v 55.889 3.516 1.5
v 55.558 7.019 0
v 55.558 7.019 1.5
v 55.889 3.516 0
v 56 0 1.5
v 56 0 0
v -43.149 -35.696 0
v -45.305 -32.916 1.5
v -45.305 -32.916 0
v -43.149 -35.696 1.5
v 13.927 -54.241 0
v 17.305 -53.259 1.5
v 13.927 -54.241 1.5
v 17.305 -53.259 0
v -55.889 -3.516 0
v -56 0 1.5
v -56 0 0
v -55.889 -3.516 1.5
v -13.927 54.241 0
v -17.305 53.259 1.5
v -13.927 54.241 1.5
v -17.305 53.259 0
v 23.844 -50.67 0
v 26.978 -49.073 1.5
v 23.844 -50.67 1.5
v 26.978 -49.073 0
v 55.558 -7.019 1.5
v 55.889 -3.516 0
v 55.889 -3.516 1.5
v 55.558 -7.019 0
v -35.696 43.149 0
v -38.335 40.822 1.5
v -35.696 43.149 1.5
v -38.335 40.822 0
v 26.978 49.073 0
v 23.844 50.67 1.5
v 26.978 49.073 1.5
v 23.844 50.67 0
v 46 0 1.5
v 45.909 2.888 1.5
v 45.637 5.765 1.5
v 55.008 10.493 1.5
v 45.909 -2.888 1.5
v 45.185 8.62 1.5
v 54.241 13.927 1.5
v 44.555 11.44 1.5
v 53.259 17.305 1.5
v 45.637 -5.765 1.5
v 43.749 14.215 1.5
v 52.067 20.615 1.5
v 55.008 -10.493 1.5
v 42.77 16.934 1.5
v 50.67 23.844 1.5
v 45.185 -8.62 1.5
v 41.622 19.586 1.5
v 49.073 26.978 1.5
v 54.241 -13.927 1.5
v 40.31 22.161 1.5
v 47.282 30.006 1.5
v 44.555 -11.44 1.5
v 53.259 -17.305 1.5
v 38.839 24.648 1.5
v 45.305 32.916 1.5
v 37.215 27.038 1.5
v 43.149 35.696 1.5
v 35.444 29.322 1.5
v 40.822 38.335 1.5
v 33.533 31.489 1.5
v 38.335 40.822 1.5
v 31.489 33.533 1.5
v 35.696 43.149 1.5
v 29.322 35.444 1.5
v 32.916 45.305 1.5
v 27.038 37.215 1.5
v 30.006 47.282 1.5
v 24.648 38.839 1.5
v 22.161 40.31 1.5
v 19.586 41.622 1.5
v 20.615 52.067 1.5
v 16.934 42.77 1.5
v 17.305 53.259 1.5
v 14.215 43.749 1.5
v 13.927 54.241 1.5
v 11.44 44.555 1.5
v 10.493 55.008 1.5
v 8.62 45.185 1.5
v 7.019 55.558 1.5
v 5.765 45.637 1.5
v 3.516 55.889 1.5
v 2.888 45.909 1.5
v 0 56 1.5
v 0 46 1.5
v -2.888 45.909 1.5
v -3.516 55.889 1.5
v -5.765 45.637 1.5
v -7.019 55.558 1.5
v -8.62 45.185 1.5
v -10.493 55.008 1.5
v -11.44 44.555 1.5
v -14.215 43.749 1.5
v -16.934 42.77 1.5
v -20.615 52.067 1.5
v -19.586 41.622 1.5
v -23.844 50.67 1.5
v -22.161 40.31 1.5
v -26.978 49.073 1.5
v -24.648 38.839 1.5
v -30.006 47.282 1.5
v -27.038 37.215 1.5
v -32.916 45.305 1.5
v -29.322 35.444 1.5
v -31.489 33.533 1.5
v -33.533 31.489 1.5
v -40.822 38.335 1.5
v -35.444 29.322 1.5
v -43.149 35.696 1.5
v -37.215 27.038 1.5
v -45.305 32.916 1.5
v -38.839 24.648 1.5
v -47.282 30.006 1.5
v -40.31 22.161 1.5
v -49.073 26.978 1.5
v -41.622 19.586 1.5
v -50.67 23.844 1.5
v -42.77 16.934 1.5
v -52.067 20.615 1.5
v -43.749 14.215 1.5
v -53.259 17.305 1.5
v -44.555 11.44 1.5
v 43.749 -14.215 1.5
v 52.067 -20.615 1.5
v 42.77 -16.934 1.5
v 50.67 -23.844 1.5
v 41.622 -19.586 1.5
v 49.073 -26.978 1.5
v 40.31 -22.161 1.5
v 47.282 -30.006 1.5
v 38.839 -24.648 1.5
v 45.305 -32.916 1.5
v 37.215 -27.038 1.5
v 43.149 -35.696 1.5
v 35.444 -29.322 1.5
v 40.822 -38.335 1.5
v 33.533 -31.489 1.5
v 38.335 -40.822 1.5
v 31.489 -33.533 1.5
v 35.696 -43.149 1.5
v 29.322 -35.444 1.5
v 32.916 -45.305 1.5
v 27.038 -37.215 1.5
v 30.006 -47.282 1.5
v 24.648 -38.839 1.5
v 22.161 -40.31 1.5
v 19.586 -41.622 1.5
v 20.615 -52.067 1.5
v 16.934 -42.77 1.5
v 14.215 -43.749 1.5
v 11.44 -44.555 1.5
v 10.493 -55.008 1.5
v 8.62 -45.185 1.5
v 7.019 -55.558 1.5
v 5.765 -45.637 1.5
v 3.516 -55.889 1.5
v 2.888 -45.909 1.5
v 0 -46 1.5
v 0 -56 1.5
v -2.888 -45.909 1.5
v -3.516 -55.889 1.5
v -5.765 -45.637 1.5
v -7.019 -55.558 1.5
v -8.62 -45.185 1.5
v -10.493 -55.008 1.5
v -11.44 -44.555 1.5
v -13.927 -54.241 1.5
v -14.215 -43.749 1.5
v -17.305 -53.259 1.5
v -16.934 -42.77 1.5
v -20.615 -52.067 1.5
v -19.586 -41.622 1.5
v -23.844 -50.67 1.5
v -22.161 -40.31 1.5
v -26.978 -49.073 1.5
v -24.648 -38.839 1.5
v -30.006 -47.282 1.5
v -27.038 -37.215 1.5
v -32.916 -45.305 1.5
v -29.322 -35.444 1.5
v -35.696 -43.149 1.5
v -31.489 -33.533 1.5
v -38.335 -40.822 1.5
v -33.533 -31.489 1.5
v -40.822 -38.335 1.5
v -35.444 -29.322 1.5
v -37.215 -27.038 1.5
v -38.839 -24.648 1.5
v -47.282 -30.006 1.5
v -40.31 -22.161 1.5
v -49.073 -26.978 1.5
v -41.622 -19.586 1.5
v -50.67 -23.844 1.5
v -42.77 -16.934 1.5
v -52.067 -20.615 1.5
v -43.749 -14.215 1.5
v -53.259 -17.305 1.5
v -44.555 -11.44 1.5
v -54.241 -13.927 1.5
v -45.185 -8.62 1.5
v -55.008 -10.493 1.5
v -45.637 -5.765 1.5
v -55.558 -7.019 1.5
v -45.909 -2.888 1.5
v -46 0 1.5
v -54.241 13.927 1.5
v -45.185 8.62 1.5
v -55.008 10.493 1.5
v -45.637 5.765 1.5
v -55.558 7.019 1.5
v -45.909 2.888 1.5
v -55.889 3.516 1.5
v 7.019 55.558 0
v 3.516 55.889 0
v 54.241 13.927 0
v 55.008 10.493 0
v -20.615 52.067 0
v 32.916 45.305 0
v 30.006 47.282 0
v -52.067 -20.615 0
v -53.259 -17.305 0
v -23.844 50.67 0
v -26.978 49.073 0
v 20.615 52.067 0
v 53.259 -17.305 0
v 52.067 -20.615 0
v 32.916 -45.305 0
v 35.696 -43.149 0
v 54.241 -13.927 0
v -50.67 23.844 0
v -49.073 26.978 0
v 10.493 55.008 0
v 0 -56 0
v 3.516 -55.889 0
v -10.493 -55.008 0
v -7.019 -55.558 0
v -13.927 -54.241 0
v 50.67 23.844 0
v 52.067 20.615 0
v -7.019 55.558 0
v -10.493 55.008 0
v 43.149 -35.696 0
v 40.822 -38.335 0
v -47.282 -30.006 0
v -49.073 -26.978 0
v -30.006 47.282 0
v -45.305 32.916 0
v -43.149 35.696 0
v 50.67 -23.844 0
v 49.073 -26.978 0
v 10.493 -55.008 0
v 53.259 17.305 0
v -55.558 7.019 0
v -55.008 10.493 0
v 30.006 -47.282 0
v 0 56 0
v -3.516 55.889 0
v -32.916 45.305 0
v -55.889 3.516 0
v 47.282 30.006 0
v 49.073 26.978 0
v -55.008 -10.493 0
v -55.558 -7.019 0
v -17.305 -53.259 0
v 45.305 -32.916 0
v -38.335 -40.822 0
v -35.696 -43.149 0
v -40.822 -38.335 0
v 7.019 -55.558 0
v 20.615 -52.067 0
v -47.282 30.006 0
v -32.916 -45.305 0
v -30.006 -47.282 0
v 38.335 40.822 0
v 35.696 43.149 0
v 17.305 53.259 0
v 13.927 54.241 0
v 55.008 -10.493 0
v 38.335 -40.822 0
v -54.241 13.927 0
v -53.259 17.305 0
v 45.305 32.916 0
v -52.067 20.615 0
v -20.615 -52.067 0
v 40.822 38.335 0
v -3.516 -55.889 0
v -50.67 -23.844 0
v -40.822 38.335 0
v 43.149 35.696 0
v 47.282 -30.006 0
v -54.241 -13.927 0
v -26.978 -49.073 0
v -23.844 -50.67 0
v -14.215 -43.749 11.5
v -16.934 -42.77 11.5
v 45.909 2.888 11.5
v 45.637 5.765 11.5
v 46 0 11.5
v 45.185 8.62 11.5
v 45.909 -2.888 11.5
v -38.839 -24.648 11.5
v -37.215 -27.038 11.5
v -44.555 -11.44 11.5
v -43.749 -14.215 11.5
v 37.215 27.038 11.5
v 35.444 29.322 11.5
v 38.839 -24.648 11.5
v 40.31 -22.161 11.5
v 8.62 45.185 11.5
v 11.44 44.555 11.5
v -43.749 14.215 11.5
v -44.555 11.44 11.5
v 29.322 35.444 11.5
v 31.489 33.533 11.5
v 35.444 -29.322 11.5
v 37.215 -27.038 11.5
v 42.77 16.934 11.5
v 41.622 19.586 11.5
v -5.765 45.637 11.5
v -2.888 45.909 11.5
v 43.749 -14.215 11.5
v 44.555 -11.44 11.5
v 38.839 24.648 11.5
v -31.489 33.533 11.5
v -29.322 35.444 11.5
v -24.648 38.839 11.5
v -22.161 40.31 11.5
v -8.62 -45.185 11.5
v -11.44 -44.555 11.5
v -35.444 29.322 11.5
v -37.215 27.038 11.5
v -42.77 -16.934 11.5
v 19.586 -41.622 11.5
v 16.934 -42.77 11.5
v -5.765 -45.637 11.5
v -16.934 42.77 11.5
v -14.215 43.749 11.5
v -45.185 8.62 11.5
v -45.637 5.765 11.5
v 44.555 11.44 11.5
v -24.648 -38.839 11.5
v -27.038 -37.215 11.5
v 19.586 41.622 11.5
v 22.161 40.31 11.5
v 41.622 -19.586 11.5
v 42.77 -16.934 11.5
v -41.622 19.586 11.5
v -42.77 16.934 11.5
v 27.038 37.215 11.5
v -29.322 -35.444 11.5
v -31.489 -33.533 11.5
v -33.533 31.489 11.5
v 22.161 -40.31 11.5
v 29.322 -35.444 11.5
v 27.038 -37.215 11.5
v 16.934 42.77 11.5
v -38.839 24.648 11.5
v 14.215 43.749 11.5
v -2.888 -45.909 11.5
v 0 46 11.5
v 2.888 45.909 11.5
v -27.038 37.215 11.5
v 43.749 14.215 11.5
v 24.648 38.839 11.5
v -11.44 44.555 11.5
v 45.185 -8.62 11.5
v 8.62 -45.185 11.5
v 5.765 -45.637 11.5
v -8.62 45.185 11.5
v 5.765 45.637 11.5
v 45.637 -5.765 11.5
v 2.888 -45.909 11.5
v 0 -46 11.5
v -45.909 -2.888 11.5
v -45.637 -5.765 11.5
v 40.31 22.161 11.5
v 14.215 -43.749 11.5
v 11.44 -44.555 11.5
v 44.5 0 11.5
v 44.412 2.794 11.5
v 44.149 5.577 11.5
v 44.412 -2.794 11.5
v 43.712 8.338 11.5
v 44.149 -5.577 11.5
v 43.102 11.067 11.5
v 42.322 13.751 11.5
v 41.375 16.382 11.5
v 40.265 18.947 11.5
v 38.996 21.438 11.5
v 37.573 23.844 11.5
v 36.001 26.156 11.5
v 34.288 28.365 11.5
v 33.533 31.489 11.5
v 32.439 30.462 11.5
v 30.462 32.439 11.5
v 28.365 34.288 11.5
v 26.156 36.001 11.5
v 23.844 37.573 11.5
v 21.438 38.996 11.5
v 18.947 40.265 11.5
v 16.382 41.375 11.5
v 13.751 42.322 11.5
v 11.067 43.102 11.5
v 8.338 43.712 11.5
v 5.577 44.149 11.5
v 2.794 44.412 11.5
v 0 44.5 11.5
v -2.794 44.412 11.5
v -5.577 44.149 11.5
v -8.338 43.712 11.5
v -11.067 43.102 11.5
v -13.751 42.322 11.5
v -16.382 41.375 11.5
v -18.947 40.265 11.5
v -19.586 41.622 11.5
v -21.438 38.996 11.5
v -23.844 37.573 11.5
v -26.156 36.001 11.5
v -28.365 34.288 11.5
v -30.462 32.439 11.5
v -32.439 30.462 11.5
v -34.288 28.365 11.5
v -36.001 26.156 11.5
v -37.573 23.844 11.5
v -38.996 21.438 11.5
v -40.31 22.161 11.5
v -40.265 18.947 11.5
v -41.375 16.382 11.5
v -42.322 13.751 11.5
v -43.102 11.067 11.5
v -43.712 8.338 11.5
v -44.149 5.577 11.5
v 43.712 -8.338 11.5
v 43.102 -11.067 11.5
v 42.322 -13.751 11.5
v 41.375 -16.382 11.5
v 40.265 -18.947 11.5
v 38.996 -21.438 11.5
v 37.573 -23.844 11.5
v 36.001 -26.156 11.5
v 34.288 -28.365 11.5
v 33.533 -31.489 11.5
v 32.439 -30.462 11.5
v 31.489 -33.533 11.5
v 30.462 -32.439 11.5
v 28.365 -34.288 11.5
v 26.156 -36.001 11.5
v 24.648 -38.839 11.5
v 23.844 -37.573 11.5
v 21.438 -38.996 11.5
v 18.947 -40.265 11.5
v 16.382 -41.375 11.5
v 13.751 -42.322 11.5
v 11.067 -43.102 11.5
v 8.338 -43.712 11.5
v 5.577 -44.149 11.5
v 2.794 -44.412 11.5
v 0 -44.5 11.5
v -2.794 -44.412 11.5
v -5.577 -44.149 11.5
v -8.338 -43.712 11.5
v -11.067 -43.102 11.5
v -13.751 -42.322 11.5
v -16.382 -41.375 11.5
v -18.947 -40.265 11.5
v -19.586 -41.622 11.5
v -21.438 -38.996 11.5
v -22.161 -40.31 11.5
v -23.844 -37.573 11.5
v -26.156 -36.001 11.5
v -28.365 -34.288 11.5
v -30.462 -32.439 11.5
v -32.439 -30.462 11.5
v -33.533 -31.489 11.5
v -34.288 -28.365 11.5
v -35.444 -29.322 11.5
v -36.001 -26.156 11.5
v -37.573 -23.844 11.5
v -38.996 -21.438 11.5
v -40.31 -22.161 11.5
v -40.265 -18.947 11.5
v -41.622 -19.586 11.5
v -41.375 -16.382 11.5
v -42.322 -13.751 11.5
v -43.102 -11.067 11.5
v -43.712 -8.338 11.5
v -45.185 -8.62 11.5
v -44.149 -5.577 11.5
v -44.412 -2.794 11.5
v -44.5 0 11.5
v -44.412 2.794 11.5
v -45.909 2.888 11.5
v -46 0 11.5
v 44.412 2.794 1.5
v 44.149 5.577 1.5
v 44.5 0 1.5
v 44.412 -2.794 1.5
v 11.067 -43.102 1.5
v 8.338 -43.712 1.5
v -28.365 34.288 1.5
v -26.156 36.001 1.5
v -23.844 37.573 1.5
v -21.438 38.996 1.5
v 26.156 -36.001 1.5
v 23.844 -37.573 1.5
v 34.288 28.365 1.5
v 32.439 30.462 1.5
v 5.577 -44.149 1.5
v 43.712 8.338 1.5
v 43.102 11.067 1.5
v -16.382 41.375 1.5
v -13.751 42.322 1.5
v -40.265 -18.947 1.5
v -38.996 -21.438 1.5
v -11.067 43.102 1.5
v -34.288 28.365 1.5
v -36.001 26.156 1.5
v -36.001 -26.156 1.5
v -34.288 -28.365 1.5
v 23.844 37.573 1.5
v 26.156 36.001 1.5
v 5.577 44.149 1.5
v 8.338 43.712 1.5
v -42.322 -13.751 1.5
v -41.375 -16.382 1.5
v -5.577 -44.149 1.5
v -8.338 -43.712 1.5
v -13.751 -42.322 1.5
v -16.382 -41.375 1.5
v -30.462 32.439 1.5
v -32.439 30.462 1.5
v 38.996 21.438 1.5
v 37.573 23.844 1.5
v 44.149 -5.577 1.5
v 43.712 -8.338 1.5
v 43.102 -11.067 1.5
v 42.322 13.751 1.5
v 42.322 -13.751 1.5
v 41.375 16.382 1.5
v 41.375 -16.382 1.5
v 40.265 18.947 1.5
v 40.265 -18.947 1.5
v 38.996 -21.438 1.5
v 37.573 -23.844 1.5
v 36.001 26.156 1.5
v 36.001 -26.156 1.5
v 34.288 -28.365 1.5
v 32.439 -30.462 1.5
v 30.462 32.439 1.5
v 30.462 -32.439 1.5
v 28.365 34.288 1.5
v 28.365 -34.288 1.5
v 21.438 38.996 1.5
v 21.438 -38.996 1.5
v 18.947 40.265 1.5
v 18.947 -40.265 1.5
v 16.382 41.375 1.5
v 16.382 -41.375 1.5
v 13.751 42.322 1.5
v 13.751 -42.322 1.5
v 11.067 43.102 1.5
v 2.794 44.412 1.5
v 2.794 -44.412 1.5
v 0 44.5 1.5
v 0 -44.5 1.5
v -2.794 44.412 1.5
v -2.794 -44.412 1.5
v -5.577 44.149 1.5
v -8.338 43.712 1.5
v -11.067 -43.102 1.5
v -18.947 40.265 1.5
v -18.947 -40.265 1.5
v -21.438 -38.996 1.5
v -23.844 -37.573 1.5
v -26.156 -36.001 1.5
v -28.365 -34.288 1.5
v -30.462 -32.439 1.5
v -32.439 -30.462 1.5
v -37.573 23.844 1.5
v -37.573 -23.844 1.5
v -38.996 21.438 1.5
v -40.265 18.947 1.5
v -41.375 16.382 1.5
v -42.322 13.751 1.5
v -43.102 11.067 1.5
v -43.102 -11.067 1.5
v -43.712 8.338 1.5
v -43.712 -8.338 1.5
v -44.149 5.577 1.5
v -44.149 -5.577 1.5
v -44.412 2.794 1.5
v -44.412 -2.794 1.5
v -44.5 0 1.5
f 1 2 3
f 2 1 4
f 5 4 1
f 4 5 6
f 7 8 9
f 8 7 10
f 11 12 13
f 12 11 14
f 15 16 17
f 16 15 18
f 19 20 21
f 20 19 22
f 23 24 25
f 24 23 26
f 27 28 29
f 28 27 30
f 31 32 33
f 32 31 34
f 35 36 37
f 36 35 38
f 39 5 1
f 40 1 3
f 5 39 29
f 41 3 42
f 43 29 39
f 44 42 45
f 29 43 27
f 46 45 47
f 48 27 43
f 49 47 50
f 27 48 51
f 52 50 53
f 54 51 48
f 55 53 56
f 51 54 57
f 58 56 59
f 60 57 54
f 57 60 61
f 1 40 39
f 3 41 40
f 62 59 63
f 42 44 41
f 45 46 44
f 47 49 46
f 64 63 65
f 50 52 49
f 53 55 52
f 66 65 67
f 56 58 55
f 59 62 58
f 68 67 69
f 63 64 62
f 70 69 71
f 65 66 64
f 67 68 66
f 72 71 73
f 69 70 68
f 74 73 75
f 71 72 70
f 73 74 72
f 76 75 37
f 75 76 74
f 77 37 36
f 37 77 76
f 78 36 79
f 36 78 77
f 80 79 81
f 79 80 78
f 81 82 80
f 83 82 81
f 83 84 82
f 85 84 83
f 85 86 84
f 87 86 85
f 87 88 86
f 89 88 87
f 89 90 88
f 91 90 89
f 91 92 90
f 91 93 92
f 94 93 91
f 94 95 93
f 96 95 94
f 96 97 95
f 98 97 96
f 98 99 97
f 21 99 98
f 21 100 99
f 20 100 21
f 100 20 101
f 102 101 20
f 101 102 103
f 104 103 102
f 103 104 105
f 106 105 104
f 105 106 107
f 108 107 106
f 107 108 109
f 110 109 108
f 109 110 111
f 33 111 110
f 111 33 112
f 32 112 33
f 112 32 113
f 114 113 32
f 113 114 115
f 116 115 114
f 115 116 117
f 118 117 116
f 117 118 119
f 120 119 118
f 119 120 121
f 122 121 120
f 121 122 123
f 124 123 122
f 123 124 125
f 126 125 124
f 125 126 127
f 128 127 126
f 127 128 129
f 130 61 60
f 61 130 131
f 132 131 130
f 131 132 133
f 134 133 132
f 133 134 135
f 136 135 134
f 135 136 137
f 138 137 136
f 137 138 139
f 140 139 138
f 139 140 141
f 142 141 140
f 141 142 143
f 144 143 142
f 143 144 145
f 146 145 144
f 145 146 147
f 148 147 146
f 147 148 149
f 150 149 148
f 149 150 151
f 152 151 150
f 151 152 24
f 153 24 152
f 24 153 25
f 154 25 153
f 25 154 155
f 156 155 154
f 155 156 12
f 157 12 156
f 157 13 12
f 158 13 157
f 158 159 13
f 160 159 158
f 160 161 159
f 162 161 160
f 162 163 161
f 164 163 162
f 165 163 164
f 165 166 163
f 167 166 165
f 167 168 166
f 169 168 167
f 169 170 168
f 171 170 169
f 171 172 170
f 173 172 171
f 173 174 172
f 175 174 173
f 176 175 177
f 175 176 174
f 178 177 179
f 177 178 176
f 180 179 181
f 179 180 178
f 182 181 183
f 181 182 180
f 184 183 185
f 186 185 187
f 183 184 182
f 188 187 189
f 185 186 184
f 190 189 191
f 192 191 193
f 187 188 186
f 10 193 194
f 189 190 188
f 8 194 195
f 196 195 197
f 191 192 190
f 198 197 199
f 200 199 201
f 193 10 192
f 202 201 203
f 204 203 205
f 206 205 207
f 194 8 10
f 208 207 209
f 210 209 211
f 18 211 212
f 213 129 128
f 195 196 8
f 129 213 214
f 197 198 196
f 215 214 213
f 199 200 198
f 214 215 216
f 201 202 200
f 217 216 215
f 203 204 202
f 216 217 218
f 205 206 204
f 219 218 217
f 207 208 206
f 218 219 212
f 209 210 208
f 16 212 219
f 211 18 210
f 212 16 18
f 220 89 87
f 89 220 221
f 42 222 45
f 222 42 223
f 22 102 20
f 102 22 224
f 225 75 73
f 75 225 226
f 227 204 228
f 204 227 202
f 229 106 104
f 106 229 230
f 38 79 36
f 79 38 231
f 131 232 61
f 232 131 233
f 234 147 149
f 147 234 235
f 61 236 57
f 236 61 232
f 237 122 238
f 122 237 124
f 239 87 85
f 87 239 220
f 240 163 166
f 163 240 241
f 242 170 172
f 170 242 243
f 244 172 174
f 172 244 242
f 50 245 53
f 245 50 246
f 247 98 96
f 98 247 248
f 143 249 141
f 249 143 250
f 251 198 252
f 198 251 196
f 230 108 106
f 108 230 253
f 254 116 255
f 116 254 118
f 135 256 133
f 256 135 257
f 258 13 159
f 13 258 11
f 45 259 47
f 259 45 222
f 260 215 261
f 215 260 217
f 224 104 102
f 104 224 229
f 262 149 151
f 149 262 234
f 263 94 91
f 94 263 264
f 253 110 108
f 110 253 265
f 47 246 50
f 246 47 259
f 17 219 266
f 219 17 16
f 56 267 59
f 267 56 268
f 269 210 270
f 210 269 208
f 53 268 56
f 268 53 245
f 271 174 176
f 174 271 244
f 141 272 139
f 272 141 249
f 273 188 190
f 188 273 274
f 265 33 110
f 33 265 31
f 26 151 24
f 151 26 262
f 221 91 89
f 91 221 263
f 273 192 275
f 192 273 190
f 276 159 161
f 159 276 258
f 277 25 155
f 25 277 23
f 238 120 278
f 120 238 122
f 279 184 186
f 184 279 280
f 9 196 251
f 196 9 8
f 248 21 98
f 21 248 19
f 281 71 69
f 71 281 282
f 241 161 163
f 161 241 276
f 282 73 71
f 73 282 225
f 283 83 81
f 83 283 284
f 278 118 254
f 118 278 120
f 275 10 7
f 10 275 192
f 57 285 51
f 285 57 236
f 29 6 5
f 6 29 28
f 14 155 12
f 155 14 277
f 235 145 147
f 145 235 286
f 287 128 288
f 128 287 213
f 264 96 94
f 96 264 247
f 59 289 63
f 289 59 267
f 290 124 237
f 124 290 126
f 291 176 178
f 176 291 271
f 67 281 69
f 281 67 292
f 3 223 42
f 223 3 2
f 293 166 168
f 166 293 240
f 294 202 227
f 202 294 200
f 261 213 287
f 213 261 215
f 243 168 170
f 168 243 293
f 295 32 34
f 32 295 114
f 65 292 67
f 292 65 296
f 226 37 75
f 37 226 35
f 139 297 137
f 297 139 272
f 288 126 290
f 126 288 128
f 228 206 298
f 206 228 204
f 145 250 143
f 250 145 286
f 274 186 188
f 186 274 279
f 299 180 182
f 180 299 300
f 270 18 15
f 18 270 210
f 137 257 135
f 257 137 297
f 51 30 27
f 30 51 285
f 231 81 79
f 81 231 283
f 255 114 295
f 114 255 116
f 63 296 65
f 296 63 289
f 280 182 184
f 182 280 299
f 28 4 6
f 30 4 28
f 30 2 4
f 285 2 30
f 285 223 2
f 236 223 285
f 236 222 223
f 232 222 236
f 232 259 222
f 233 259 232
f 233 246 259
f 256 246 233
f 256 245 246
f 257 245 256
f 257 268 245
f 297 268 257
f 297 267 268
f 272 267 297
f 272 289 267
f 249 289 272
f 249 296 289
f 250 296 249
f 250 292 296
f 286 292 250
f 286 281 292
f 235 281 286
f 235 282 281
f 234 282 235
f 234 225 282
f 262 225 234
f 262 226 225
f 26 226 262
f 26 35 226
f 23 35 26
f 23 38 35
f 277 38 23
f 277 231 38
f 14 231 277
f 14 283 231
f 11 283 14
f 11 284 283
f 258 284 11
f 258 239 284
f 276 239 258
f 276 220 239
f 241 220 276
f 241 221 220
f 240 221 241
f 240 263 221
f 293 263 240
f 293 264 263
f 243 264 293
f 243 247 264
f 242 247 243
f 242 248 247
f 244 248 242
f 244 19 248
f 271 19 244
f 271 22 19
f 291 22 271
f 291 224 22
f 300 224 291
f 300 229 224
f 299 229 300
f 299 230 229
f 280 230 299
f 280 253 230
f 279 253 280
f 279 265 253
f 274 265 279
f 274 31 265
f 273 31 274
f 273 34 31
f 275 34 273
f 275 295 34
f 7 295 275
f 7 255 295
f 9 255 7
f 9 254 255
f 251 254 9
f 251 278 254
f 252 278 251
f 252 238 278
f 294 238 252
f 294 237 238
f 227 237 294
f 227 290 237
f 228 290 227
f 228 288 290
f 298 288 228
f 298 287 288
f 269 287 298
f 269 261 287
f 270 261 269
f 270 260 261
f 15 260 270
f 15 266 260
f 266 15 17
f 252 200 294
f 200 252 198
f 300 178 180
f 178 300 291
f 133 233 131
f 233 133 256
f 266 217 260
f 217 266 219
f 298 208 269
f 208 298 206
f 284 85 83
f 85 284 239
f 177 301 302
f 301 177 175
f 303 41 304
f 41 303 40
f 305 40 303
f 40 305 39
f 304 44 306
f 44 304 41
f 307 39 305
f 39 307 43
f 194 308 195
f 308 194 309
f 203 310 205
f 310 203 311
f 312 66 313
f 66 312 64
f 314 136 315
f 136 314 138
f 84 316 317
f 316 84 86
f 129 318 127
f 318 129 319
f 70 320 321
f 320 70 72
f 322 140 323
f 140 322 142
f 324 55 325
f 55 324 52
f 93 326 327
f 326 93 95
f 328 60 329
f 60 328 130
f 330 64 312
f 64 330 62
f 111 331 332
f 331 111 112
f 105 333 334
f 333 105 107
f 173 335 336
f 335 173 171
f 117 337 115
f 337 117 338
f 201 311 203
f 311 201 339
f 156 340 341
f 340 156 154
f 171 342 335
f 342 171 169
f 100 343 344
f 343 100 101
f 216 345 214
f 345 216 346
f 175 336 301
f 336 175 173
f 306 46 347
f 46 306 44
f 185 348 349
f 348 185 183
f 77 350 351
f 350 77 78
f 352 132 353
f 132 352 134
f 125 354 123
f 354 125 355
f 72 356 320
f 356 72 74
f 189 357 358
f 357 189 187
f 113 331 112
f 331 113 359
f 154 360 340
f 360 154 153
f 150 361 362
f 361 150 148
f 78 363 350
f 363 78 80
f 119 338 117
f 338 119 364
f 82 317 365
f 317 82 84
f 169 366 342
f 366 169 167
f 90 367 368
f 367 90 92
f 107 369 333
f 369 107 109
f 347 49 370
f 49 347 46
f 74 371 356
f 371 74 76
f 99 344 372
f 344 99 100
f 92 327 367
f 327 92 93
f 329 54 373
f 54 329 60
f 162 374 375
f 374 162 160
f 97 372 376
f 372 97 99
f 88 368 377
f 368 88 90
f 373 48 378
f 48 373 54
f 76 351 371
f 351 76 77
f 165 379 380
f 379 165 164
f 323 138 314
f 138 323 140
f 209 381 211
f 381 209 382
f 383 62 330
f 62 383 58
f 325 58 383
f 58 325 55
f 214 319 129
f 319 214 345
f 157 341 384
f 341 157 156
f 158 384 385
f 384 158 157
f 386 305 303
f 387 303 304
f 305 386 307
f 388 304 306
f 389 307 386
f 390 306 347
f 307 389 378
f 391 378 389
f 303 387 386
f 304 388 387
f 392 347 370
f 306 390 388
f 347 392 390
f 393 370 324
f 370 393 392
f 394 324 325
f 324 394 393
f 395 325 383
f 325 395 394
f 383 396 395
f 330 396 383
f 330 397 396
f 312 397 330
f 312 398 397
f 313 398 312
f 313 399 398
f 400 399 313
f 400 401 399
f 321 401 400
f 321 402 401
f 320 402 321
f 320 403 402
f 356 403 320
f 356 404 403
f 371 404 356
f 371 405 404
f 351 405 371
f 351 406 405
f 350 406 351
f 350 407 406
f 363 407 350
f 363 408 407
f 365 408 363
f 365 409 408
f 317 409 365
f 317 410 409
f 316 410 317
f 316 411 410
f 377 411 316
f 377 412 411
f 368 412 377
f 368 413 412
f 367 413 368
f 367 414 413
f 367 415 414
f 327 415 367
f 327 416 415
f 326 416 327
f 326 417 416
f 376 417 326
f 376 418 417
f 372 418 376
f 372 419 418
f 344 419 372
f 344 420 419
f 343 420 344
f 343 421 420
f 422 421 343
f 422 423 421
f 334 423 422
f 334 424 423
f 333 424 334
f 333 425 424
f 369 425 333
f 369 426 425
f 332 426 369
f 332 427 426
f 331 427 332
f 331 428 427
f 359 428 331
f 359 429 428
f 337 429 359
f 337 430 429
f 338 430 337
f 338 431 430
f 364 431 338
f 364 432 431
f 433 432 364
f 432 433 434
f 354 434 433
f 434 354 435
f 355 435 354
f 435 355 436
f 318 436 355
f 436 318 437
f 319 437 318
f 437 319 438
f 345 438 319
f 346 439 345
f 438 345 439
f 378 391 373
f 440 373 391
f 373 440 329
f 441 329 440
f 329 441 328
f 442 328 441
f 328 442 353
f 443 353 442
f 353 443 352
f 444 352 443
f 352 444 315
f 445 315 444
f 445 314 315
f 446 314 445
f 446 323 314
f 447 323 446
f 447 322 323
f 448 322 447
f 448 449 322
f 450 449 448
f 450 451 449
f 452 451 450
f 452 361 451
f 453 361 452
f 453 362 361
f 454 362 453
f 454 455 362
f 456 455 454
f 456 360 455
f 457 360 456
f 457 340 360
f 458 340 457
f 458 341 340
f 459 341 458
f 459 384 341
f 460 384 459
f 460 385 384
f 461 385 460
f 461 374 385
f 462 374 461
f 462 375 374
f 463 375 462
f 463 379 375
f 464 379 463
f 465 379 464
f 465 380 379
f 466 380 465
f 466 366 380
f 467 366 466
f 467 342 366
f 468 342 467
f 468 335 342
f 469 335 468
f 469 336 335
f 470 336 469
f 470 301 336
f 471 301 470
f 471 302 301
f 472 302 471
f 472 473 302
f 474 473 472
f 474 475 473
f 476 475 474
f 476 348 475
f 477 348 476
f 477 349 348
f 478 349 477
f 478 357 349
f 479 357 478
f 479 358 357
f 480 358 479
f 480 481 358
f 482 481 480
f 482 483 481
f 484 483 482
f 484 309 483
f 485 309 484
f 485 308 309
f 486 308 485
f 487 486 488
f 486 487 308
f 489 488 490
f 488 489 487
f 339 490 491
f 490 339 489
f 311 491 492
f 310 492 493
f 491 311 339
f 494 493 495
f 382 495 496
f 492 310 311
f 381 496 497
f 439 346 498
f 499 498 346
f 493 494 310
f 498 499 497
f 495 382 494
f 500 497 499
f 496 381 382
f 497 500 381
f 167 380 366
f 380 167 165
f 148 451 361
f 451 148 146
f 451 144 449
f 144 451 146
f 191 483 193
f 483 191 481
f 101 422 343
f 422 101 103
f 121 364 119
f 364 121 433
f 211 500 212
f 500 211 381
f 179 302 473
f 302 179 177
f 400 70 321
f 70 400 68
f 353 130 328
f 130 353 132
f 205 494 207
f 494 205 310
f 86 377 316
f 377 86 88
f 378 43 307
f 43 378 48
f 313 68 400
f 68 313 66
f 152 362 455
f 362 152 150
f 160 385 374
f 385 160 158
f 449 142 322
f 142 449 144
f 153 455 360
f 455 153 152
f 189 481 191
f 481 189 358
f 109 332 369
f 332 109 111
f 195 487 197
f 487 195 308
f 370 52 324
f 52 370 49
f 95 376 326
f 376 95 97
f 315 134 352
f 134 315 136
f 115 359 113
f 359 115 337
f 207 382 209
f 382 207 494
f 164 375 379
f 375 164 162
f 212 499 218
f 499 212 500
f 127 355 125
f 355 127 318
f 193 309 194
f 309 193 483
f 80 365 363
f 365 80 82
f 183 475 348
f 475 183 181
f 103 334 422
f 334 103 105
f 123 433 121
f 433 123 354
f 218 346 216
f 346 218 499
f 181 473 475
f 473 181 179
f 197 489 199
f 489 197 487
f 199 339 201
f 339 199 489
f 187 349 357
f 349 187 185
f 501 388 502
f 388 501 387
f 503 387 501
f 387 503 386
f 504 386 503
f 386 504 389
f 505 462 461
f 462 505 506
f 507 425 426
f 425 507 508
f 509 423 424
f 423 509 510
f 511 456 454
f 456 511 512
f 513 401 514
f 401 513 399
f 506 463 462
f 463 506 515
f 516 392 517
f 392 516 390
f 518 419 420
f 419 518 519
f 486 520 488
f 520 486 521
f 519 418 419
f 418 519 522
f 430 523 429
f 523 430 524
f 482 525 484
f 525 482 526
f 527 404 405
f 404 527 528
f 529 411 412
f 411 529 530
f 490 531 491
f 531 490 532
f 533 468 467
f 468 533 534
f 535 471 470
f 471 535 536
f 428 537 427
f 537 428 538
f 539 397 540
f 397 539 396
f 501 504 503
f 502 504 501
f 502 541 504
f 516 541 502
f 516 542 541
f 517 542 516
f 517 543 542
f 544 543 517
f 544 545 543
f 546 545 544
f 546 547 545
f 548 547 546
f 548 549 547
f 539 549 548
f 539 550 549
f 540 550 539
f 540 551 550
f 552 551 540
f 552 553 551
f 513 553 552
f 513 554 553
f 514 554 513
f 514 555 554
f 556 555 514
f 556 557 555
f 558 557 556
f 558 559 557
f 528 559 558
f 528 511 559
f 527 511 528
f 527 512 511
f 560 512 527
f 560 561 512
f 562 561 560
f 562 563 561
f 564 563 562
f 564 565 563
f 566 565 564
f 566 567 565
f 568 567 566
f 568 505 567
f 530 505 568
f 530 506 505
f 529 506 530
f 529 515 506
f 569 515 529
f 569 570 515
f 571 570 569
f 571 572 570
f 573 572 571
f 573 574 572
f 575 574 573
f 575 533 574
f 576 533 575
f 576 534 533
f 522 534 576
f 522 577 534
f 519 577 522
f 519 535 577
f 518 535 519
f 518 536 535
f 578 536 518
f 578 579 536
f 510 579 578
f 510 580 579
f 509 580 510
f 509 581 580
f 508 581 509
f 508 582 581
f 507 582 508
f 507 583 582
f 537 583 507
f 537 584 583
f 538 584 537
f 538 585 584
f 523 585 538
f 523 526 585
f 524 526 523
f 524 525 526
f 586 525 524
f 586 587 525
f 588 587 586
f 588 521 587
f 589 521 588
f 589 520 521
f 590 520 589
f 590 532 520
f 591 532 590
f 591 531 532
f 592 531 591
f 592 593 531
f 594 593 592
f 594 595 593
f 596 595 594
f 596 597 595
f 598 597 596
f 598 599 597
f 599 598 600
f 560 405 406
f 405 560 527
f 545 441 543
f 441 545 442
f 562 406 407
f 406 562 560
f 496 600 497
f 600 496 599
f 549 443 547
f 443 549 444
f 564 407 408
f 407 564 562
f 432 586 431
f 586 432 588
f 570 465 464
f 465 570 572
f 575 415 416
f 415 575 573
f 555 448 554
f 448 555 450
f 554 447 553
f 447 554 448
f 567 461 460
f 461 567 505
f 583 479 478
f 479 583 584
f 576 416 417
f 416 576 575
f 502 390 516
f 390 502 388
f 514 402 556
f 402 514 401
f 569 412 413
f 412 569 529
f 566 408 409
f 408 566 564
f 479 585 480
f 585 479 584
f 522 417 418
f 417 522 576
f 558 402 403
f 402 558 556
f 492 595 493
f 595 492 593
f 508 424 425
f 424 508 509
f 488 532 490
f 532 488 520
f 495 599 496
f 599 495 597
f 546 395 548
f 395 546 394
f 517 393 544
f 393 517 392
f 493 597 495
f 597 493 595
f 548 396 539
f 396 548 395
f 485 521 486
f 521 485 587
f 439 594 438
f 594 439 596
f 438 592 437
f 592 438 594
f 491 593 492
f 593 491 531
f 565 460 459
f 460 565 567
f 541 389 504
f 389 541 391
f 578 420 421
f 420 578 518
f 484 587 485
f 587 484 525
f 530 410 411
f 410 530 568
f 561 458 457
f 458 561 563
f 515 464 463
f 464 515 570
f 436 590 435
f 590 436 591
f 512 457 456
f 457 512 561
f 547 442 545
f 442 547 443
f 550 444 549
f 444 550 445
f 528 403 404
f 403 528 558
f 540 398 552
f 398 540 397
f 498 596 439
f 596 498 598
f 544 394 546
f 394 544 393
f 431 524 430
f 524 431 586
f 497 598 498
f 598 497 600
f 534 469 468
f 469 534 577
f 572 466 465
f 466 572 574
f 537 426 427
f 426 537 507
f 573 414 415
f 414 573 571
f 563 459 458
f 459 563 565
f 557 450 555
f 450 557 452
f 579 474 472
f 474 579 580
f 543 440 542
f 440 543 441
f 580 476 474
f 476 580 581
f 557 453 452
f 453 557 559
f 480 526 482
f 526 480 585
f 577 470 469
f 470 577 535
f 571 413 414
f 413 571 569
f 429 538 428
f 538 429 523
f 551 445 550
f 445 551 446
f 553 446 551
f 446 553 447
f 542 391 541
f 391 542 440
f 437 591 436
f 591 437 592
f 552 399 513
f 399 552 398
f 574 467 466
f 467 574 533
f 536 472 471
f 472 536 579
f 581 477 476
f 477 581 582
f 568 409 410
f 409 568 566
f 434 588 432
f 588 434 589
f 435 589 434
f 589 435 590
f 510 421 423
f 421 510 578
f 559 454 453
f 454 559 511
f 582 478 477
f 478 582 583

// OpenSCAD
//CREDITS OF THIS FILE GO TO BIG CLIVE FROM BIGCLIVEDOTCOM 
//link to his channel (https://www.youtube.com/@bigclivedotcom)


//HEPA filter blanking cap
$fn=100;
//You can adjust these four variables
//Mainly the filter hole diameter
filterhole=92;     //diameter of filter hole
rim=10;               //size of rim (10)
insert=10;          //Length of insert (10)
thickness=1.5;  //Thickness of plastic (1.5)
//Do not adjust anything below here
wall=(2*thickness);
cap=thickness+insert;
difference(){
union(){
//seal plate 
cylinder(h=thickness,d=filterhole+(2*rim));
//filter insert 
cylinder(h=cap,d=filterhole);
}
//filter insert core
translate([0,0,thickness])  
cylinder(h=cap+1,d=filterhole-wall);
}
